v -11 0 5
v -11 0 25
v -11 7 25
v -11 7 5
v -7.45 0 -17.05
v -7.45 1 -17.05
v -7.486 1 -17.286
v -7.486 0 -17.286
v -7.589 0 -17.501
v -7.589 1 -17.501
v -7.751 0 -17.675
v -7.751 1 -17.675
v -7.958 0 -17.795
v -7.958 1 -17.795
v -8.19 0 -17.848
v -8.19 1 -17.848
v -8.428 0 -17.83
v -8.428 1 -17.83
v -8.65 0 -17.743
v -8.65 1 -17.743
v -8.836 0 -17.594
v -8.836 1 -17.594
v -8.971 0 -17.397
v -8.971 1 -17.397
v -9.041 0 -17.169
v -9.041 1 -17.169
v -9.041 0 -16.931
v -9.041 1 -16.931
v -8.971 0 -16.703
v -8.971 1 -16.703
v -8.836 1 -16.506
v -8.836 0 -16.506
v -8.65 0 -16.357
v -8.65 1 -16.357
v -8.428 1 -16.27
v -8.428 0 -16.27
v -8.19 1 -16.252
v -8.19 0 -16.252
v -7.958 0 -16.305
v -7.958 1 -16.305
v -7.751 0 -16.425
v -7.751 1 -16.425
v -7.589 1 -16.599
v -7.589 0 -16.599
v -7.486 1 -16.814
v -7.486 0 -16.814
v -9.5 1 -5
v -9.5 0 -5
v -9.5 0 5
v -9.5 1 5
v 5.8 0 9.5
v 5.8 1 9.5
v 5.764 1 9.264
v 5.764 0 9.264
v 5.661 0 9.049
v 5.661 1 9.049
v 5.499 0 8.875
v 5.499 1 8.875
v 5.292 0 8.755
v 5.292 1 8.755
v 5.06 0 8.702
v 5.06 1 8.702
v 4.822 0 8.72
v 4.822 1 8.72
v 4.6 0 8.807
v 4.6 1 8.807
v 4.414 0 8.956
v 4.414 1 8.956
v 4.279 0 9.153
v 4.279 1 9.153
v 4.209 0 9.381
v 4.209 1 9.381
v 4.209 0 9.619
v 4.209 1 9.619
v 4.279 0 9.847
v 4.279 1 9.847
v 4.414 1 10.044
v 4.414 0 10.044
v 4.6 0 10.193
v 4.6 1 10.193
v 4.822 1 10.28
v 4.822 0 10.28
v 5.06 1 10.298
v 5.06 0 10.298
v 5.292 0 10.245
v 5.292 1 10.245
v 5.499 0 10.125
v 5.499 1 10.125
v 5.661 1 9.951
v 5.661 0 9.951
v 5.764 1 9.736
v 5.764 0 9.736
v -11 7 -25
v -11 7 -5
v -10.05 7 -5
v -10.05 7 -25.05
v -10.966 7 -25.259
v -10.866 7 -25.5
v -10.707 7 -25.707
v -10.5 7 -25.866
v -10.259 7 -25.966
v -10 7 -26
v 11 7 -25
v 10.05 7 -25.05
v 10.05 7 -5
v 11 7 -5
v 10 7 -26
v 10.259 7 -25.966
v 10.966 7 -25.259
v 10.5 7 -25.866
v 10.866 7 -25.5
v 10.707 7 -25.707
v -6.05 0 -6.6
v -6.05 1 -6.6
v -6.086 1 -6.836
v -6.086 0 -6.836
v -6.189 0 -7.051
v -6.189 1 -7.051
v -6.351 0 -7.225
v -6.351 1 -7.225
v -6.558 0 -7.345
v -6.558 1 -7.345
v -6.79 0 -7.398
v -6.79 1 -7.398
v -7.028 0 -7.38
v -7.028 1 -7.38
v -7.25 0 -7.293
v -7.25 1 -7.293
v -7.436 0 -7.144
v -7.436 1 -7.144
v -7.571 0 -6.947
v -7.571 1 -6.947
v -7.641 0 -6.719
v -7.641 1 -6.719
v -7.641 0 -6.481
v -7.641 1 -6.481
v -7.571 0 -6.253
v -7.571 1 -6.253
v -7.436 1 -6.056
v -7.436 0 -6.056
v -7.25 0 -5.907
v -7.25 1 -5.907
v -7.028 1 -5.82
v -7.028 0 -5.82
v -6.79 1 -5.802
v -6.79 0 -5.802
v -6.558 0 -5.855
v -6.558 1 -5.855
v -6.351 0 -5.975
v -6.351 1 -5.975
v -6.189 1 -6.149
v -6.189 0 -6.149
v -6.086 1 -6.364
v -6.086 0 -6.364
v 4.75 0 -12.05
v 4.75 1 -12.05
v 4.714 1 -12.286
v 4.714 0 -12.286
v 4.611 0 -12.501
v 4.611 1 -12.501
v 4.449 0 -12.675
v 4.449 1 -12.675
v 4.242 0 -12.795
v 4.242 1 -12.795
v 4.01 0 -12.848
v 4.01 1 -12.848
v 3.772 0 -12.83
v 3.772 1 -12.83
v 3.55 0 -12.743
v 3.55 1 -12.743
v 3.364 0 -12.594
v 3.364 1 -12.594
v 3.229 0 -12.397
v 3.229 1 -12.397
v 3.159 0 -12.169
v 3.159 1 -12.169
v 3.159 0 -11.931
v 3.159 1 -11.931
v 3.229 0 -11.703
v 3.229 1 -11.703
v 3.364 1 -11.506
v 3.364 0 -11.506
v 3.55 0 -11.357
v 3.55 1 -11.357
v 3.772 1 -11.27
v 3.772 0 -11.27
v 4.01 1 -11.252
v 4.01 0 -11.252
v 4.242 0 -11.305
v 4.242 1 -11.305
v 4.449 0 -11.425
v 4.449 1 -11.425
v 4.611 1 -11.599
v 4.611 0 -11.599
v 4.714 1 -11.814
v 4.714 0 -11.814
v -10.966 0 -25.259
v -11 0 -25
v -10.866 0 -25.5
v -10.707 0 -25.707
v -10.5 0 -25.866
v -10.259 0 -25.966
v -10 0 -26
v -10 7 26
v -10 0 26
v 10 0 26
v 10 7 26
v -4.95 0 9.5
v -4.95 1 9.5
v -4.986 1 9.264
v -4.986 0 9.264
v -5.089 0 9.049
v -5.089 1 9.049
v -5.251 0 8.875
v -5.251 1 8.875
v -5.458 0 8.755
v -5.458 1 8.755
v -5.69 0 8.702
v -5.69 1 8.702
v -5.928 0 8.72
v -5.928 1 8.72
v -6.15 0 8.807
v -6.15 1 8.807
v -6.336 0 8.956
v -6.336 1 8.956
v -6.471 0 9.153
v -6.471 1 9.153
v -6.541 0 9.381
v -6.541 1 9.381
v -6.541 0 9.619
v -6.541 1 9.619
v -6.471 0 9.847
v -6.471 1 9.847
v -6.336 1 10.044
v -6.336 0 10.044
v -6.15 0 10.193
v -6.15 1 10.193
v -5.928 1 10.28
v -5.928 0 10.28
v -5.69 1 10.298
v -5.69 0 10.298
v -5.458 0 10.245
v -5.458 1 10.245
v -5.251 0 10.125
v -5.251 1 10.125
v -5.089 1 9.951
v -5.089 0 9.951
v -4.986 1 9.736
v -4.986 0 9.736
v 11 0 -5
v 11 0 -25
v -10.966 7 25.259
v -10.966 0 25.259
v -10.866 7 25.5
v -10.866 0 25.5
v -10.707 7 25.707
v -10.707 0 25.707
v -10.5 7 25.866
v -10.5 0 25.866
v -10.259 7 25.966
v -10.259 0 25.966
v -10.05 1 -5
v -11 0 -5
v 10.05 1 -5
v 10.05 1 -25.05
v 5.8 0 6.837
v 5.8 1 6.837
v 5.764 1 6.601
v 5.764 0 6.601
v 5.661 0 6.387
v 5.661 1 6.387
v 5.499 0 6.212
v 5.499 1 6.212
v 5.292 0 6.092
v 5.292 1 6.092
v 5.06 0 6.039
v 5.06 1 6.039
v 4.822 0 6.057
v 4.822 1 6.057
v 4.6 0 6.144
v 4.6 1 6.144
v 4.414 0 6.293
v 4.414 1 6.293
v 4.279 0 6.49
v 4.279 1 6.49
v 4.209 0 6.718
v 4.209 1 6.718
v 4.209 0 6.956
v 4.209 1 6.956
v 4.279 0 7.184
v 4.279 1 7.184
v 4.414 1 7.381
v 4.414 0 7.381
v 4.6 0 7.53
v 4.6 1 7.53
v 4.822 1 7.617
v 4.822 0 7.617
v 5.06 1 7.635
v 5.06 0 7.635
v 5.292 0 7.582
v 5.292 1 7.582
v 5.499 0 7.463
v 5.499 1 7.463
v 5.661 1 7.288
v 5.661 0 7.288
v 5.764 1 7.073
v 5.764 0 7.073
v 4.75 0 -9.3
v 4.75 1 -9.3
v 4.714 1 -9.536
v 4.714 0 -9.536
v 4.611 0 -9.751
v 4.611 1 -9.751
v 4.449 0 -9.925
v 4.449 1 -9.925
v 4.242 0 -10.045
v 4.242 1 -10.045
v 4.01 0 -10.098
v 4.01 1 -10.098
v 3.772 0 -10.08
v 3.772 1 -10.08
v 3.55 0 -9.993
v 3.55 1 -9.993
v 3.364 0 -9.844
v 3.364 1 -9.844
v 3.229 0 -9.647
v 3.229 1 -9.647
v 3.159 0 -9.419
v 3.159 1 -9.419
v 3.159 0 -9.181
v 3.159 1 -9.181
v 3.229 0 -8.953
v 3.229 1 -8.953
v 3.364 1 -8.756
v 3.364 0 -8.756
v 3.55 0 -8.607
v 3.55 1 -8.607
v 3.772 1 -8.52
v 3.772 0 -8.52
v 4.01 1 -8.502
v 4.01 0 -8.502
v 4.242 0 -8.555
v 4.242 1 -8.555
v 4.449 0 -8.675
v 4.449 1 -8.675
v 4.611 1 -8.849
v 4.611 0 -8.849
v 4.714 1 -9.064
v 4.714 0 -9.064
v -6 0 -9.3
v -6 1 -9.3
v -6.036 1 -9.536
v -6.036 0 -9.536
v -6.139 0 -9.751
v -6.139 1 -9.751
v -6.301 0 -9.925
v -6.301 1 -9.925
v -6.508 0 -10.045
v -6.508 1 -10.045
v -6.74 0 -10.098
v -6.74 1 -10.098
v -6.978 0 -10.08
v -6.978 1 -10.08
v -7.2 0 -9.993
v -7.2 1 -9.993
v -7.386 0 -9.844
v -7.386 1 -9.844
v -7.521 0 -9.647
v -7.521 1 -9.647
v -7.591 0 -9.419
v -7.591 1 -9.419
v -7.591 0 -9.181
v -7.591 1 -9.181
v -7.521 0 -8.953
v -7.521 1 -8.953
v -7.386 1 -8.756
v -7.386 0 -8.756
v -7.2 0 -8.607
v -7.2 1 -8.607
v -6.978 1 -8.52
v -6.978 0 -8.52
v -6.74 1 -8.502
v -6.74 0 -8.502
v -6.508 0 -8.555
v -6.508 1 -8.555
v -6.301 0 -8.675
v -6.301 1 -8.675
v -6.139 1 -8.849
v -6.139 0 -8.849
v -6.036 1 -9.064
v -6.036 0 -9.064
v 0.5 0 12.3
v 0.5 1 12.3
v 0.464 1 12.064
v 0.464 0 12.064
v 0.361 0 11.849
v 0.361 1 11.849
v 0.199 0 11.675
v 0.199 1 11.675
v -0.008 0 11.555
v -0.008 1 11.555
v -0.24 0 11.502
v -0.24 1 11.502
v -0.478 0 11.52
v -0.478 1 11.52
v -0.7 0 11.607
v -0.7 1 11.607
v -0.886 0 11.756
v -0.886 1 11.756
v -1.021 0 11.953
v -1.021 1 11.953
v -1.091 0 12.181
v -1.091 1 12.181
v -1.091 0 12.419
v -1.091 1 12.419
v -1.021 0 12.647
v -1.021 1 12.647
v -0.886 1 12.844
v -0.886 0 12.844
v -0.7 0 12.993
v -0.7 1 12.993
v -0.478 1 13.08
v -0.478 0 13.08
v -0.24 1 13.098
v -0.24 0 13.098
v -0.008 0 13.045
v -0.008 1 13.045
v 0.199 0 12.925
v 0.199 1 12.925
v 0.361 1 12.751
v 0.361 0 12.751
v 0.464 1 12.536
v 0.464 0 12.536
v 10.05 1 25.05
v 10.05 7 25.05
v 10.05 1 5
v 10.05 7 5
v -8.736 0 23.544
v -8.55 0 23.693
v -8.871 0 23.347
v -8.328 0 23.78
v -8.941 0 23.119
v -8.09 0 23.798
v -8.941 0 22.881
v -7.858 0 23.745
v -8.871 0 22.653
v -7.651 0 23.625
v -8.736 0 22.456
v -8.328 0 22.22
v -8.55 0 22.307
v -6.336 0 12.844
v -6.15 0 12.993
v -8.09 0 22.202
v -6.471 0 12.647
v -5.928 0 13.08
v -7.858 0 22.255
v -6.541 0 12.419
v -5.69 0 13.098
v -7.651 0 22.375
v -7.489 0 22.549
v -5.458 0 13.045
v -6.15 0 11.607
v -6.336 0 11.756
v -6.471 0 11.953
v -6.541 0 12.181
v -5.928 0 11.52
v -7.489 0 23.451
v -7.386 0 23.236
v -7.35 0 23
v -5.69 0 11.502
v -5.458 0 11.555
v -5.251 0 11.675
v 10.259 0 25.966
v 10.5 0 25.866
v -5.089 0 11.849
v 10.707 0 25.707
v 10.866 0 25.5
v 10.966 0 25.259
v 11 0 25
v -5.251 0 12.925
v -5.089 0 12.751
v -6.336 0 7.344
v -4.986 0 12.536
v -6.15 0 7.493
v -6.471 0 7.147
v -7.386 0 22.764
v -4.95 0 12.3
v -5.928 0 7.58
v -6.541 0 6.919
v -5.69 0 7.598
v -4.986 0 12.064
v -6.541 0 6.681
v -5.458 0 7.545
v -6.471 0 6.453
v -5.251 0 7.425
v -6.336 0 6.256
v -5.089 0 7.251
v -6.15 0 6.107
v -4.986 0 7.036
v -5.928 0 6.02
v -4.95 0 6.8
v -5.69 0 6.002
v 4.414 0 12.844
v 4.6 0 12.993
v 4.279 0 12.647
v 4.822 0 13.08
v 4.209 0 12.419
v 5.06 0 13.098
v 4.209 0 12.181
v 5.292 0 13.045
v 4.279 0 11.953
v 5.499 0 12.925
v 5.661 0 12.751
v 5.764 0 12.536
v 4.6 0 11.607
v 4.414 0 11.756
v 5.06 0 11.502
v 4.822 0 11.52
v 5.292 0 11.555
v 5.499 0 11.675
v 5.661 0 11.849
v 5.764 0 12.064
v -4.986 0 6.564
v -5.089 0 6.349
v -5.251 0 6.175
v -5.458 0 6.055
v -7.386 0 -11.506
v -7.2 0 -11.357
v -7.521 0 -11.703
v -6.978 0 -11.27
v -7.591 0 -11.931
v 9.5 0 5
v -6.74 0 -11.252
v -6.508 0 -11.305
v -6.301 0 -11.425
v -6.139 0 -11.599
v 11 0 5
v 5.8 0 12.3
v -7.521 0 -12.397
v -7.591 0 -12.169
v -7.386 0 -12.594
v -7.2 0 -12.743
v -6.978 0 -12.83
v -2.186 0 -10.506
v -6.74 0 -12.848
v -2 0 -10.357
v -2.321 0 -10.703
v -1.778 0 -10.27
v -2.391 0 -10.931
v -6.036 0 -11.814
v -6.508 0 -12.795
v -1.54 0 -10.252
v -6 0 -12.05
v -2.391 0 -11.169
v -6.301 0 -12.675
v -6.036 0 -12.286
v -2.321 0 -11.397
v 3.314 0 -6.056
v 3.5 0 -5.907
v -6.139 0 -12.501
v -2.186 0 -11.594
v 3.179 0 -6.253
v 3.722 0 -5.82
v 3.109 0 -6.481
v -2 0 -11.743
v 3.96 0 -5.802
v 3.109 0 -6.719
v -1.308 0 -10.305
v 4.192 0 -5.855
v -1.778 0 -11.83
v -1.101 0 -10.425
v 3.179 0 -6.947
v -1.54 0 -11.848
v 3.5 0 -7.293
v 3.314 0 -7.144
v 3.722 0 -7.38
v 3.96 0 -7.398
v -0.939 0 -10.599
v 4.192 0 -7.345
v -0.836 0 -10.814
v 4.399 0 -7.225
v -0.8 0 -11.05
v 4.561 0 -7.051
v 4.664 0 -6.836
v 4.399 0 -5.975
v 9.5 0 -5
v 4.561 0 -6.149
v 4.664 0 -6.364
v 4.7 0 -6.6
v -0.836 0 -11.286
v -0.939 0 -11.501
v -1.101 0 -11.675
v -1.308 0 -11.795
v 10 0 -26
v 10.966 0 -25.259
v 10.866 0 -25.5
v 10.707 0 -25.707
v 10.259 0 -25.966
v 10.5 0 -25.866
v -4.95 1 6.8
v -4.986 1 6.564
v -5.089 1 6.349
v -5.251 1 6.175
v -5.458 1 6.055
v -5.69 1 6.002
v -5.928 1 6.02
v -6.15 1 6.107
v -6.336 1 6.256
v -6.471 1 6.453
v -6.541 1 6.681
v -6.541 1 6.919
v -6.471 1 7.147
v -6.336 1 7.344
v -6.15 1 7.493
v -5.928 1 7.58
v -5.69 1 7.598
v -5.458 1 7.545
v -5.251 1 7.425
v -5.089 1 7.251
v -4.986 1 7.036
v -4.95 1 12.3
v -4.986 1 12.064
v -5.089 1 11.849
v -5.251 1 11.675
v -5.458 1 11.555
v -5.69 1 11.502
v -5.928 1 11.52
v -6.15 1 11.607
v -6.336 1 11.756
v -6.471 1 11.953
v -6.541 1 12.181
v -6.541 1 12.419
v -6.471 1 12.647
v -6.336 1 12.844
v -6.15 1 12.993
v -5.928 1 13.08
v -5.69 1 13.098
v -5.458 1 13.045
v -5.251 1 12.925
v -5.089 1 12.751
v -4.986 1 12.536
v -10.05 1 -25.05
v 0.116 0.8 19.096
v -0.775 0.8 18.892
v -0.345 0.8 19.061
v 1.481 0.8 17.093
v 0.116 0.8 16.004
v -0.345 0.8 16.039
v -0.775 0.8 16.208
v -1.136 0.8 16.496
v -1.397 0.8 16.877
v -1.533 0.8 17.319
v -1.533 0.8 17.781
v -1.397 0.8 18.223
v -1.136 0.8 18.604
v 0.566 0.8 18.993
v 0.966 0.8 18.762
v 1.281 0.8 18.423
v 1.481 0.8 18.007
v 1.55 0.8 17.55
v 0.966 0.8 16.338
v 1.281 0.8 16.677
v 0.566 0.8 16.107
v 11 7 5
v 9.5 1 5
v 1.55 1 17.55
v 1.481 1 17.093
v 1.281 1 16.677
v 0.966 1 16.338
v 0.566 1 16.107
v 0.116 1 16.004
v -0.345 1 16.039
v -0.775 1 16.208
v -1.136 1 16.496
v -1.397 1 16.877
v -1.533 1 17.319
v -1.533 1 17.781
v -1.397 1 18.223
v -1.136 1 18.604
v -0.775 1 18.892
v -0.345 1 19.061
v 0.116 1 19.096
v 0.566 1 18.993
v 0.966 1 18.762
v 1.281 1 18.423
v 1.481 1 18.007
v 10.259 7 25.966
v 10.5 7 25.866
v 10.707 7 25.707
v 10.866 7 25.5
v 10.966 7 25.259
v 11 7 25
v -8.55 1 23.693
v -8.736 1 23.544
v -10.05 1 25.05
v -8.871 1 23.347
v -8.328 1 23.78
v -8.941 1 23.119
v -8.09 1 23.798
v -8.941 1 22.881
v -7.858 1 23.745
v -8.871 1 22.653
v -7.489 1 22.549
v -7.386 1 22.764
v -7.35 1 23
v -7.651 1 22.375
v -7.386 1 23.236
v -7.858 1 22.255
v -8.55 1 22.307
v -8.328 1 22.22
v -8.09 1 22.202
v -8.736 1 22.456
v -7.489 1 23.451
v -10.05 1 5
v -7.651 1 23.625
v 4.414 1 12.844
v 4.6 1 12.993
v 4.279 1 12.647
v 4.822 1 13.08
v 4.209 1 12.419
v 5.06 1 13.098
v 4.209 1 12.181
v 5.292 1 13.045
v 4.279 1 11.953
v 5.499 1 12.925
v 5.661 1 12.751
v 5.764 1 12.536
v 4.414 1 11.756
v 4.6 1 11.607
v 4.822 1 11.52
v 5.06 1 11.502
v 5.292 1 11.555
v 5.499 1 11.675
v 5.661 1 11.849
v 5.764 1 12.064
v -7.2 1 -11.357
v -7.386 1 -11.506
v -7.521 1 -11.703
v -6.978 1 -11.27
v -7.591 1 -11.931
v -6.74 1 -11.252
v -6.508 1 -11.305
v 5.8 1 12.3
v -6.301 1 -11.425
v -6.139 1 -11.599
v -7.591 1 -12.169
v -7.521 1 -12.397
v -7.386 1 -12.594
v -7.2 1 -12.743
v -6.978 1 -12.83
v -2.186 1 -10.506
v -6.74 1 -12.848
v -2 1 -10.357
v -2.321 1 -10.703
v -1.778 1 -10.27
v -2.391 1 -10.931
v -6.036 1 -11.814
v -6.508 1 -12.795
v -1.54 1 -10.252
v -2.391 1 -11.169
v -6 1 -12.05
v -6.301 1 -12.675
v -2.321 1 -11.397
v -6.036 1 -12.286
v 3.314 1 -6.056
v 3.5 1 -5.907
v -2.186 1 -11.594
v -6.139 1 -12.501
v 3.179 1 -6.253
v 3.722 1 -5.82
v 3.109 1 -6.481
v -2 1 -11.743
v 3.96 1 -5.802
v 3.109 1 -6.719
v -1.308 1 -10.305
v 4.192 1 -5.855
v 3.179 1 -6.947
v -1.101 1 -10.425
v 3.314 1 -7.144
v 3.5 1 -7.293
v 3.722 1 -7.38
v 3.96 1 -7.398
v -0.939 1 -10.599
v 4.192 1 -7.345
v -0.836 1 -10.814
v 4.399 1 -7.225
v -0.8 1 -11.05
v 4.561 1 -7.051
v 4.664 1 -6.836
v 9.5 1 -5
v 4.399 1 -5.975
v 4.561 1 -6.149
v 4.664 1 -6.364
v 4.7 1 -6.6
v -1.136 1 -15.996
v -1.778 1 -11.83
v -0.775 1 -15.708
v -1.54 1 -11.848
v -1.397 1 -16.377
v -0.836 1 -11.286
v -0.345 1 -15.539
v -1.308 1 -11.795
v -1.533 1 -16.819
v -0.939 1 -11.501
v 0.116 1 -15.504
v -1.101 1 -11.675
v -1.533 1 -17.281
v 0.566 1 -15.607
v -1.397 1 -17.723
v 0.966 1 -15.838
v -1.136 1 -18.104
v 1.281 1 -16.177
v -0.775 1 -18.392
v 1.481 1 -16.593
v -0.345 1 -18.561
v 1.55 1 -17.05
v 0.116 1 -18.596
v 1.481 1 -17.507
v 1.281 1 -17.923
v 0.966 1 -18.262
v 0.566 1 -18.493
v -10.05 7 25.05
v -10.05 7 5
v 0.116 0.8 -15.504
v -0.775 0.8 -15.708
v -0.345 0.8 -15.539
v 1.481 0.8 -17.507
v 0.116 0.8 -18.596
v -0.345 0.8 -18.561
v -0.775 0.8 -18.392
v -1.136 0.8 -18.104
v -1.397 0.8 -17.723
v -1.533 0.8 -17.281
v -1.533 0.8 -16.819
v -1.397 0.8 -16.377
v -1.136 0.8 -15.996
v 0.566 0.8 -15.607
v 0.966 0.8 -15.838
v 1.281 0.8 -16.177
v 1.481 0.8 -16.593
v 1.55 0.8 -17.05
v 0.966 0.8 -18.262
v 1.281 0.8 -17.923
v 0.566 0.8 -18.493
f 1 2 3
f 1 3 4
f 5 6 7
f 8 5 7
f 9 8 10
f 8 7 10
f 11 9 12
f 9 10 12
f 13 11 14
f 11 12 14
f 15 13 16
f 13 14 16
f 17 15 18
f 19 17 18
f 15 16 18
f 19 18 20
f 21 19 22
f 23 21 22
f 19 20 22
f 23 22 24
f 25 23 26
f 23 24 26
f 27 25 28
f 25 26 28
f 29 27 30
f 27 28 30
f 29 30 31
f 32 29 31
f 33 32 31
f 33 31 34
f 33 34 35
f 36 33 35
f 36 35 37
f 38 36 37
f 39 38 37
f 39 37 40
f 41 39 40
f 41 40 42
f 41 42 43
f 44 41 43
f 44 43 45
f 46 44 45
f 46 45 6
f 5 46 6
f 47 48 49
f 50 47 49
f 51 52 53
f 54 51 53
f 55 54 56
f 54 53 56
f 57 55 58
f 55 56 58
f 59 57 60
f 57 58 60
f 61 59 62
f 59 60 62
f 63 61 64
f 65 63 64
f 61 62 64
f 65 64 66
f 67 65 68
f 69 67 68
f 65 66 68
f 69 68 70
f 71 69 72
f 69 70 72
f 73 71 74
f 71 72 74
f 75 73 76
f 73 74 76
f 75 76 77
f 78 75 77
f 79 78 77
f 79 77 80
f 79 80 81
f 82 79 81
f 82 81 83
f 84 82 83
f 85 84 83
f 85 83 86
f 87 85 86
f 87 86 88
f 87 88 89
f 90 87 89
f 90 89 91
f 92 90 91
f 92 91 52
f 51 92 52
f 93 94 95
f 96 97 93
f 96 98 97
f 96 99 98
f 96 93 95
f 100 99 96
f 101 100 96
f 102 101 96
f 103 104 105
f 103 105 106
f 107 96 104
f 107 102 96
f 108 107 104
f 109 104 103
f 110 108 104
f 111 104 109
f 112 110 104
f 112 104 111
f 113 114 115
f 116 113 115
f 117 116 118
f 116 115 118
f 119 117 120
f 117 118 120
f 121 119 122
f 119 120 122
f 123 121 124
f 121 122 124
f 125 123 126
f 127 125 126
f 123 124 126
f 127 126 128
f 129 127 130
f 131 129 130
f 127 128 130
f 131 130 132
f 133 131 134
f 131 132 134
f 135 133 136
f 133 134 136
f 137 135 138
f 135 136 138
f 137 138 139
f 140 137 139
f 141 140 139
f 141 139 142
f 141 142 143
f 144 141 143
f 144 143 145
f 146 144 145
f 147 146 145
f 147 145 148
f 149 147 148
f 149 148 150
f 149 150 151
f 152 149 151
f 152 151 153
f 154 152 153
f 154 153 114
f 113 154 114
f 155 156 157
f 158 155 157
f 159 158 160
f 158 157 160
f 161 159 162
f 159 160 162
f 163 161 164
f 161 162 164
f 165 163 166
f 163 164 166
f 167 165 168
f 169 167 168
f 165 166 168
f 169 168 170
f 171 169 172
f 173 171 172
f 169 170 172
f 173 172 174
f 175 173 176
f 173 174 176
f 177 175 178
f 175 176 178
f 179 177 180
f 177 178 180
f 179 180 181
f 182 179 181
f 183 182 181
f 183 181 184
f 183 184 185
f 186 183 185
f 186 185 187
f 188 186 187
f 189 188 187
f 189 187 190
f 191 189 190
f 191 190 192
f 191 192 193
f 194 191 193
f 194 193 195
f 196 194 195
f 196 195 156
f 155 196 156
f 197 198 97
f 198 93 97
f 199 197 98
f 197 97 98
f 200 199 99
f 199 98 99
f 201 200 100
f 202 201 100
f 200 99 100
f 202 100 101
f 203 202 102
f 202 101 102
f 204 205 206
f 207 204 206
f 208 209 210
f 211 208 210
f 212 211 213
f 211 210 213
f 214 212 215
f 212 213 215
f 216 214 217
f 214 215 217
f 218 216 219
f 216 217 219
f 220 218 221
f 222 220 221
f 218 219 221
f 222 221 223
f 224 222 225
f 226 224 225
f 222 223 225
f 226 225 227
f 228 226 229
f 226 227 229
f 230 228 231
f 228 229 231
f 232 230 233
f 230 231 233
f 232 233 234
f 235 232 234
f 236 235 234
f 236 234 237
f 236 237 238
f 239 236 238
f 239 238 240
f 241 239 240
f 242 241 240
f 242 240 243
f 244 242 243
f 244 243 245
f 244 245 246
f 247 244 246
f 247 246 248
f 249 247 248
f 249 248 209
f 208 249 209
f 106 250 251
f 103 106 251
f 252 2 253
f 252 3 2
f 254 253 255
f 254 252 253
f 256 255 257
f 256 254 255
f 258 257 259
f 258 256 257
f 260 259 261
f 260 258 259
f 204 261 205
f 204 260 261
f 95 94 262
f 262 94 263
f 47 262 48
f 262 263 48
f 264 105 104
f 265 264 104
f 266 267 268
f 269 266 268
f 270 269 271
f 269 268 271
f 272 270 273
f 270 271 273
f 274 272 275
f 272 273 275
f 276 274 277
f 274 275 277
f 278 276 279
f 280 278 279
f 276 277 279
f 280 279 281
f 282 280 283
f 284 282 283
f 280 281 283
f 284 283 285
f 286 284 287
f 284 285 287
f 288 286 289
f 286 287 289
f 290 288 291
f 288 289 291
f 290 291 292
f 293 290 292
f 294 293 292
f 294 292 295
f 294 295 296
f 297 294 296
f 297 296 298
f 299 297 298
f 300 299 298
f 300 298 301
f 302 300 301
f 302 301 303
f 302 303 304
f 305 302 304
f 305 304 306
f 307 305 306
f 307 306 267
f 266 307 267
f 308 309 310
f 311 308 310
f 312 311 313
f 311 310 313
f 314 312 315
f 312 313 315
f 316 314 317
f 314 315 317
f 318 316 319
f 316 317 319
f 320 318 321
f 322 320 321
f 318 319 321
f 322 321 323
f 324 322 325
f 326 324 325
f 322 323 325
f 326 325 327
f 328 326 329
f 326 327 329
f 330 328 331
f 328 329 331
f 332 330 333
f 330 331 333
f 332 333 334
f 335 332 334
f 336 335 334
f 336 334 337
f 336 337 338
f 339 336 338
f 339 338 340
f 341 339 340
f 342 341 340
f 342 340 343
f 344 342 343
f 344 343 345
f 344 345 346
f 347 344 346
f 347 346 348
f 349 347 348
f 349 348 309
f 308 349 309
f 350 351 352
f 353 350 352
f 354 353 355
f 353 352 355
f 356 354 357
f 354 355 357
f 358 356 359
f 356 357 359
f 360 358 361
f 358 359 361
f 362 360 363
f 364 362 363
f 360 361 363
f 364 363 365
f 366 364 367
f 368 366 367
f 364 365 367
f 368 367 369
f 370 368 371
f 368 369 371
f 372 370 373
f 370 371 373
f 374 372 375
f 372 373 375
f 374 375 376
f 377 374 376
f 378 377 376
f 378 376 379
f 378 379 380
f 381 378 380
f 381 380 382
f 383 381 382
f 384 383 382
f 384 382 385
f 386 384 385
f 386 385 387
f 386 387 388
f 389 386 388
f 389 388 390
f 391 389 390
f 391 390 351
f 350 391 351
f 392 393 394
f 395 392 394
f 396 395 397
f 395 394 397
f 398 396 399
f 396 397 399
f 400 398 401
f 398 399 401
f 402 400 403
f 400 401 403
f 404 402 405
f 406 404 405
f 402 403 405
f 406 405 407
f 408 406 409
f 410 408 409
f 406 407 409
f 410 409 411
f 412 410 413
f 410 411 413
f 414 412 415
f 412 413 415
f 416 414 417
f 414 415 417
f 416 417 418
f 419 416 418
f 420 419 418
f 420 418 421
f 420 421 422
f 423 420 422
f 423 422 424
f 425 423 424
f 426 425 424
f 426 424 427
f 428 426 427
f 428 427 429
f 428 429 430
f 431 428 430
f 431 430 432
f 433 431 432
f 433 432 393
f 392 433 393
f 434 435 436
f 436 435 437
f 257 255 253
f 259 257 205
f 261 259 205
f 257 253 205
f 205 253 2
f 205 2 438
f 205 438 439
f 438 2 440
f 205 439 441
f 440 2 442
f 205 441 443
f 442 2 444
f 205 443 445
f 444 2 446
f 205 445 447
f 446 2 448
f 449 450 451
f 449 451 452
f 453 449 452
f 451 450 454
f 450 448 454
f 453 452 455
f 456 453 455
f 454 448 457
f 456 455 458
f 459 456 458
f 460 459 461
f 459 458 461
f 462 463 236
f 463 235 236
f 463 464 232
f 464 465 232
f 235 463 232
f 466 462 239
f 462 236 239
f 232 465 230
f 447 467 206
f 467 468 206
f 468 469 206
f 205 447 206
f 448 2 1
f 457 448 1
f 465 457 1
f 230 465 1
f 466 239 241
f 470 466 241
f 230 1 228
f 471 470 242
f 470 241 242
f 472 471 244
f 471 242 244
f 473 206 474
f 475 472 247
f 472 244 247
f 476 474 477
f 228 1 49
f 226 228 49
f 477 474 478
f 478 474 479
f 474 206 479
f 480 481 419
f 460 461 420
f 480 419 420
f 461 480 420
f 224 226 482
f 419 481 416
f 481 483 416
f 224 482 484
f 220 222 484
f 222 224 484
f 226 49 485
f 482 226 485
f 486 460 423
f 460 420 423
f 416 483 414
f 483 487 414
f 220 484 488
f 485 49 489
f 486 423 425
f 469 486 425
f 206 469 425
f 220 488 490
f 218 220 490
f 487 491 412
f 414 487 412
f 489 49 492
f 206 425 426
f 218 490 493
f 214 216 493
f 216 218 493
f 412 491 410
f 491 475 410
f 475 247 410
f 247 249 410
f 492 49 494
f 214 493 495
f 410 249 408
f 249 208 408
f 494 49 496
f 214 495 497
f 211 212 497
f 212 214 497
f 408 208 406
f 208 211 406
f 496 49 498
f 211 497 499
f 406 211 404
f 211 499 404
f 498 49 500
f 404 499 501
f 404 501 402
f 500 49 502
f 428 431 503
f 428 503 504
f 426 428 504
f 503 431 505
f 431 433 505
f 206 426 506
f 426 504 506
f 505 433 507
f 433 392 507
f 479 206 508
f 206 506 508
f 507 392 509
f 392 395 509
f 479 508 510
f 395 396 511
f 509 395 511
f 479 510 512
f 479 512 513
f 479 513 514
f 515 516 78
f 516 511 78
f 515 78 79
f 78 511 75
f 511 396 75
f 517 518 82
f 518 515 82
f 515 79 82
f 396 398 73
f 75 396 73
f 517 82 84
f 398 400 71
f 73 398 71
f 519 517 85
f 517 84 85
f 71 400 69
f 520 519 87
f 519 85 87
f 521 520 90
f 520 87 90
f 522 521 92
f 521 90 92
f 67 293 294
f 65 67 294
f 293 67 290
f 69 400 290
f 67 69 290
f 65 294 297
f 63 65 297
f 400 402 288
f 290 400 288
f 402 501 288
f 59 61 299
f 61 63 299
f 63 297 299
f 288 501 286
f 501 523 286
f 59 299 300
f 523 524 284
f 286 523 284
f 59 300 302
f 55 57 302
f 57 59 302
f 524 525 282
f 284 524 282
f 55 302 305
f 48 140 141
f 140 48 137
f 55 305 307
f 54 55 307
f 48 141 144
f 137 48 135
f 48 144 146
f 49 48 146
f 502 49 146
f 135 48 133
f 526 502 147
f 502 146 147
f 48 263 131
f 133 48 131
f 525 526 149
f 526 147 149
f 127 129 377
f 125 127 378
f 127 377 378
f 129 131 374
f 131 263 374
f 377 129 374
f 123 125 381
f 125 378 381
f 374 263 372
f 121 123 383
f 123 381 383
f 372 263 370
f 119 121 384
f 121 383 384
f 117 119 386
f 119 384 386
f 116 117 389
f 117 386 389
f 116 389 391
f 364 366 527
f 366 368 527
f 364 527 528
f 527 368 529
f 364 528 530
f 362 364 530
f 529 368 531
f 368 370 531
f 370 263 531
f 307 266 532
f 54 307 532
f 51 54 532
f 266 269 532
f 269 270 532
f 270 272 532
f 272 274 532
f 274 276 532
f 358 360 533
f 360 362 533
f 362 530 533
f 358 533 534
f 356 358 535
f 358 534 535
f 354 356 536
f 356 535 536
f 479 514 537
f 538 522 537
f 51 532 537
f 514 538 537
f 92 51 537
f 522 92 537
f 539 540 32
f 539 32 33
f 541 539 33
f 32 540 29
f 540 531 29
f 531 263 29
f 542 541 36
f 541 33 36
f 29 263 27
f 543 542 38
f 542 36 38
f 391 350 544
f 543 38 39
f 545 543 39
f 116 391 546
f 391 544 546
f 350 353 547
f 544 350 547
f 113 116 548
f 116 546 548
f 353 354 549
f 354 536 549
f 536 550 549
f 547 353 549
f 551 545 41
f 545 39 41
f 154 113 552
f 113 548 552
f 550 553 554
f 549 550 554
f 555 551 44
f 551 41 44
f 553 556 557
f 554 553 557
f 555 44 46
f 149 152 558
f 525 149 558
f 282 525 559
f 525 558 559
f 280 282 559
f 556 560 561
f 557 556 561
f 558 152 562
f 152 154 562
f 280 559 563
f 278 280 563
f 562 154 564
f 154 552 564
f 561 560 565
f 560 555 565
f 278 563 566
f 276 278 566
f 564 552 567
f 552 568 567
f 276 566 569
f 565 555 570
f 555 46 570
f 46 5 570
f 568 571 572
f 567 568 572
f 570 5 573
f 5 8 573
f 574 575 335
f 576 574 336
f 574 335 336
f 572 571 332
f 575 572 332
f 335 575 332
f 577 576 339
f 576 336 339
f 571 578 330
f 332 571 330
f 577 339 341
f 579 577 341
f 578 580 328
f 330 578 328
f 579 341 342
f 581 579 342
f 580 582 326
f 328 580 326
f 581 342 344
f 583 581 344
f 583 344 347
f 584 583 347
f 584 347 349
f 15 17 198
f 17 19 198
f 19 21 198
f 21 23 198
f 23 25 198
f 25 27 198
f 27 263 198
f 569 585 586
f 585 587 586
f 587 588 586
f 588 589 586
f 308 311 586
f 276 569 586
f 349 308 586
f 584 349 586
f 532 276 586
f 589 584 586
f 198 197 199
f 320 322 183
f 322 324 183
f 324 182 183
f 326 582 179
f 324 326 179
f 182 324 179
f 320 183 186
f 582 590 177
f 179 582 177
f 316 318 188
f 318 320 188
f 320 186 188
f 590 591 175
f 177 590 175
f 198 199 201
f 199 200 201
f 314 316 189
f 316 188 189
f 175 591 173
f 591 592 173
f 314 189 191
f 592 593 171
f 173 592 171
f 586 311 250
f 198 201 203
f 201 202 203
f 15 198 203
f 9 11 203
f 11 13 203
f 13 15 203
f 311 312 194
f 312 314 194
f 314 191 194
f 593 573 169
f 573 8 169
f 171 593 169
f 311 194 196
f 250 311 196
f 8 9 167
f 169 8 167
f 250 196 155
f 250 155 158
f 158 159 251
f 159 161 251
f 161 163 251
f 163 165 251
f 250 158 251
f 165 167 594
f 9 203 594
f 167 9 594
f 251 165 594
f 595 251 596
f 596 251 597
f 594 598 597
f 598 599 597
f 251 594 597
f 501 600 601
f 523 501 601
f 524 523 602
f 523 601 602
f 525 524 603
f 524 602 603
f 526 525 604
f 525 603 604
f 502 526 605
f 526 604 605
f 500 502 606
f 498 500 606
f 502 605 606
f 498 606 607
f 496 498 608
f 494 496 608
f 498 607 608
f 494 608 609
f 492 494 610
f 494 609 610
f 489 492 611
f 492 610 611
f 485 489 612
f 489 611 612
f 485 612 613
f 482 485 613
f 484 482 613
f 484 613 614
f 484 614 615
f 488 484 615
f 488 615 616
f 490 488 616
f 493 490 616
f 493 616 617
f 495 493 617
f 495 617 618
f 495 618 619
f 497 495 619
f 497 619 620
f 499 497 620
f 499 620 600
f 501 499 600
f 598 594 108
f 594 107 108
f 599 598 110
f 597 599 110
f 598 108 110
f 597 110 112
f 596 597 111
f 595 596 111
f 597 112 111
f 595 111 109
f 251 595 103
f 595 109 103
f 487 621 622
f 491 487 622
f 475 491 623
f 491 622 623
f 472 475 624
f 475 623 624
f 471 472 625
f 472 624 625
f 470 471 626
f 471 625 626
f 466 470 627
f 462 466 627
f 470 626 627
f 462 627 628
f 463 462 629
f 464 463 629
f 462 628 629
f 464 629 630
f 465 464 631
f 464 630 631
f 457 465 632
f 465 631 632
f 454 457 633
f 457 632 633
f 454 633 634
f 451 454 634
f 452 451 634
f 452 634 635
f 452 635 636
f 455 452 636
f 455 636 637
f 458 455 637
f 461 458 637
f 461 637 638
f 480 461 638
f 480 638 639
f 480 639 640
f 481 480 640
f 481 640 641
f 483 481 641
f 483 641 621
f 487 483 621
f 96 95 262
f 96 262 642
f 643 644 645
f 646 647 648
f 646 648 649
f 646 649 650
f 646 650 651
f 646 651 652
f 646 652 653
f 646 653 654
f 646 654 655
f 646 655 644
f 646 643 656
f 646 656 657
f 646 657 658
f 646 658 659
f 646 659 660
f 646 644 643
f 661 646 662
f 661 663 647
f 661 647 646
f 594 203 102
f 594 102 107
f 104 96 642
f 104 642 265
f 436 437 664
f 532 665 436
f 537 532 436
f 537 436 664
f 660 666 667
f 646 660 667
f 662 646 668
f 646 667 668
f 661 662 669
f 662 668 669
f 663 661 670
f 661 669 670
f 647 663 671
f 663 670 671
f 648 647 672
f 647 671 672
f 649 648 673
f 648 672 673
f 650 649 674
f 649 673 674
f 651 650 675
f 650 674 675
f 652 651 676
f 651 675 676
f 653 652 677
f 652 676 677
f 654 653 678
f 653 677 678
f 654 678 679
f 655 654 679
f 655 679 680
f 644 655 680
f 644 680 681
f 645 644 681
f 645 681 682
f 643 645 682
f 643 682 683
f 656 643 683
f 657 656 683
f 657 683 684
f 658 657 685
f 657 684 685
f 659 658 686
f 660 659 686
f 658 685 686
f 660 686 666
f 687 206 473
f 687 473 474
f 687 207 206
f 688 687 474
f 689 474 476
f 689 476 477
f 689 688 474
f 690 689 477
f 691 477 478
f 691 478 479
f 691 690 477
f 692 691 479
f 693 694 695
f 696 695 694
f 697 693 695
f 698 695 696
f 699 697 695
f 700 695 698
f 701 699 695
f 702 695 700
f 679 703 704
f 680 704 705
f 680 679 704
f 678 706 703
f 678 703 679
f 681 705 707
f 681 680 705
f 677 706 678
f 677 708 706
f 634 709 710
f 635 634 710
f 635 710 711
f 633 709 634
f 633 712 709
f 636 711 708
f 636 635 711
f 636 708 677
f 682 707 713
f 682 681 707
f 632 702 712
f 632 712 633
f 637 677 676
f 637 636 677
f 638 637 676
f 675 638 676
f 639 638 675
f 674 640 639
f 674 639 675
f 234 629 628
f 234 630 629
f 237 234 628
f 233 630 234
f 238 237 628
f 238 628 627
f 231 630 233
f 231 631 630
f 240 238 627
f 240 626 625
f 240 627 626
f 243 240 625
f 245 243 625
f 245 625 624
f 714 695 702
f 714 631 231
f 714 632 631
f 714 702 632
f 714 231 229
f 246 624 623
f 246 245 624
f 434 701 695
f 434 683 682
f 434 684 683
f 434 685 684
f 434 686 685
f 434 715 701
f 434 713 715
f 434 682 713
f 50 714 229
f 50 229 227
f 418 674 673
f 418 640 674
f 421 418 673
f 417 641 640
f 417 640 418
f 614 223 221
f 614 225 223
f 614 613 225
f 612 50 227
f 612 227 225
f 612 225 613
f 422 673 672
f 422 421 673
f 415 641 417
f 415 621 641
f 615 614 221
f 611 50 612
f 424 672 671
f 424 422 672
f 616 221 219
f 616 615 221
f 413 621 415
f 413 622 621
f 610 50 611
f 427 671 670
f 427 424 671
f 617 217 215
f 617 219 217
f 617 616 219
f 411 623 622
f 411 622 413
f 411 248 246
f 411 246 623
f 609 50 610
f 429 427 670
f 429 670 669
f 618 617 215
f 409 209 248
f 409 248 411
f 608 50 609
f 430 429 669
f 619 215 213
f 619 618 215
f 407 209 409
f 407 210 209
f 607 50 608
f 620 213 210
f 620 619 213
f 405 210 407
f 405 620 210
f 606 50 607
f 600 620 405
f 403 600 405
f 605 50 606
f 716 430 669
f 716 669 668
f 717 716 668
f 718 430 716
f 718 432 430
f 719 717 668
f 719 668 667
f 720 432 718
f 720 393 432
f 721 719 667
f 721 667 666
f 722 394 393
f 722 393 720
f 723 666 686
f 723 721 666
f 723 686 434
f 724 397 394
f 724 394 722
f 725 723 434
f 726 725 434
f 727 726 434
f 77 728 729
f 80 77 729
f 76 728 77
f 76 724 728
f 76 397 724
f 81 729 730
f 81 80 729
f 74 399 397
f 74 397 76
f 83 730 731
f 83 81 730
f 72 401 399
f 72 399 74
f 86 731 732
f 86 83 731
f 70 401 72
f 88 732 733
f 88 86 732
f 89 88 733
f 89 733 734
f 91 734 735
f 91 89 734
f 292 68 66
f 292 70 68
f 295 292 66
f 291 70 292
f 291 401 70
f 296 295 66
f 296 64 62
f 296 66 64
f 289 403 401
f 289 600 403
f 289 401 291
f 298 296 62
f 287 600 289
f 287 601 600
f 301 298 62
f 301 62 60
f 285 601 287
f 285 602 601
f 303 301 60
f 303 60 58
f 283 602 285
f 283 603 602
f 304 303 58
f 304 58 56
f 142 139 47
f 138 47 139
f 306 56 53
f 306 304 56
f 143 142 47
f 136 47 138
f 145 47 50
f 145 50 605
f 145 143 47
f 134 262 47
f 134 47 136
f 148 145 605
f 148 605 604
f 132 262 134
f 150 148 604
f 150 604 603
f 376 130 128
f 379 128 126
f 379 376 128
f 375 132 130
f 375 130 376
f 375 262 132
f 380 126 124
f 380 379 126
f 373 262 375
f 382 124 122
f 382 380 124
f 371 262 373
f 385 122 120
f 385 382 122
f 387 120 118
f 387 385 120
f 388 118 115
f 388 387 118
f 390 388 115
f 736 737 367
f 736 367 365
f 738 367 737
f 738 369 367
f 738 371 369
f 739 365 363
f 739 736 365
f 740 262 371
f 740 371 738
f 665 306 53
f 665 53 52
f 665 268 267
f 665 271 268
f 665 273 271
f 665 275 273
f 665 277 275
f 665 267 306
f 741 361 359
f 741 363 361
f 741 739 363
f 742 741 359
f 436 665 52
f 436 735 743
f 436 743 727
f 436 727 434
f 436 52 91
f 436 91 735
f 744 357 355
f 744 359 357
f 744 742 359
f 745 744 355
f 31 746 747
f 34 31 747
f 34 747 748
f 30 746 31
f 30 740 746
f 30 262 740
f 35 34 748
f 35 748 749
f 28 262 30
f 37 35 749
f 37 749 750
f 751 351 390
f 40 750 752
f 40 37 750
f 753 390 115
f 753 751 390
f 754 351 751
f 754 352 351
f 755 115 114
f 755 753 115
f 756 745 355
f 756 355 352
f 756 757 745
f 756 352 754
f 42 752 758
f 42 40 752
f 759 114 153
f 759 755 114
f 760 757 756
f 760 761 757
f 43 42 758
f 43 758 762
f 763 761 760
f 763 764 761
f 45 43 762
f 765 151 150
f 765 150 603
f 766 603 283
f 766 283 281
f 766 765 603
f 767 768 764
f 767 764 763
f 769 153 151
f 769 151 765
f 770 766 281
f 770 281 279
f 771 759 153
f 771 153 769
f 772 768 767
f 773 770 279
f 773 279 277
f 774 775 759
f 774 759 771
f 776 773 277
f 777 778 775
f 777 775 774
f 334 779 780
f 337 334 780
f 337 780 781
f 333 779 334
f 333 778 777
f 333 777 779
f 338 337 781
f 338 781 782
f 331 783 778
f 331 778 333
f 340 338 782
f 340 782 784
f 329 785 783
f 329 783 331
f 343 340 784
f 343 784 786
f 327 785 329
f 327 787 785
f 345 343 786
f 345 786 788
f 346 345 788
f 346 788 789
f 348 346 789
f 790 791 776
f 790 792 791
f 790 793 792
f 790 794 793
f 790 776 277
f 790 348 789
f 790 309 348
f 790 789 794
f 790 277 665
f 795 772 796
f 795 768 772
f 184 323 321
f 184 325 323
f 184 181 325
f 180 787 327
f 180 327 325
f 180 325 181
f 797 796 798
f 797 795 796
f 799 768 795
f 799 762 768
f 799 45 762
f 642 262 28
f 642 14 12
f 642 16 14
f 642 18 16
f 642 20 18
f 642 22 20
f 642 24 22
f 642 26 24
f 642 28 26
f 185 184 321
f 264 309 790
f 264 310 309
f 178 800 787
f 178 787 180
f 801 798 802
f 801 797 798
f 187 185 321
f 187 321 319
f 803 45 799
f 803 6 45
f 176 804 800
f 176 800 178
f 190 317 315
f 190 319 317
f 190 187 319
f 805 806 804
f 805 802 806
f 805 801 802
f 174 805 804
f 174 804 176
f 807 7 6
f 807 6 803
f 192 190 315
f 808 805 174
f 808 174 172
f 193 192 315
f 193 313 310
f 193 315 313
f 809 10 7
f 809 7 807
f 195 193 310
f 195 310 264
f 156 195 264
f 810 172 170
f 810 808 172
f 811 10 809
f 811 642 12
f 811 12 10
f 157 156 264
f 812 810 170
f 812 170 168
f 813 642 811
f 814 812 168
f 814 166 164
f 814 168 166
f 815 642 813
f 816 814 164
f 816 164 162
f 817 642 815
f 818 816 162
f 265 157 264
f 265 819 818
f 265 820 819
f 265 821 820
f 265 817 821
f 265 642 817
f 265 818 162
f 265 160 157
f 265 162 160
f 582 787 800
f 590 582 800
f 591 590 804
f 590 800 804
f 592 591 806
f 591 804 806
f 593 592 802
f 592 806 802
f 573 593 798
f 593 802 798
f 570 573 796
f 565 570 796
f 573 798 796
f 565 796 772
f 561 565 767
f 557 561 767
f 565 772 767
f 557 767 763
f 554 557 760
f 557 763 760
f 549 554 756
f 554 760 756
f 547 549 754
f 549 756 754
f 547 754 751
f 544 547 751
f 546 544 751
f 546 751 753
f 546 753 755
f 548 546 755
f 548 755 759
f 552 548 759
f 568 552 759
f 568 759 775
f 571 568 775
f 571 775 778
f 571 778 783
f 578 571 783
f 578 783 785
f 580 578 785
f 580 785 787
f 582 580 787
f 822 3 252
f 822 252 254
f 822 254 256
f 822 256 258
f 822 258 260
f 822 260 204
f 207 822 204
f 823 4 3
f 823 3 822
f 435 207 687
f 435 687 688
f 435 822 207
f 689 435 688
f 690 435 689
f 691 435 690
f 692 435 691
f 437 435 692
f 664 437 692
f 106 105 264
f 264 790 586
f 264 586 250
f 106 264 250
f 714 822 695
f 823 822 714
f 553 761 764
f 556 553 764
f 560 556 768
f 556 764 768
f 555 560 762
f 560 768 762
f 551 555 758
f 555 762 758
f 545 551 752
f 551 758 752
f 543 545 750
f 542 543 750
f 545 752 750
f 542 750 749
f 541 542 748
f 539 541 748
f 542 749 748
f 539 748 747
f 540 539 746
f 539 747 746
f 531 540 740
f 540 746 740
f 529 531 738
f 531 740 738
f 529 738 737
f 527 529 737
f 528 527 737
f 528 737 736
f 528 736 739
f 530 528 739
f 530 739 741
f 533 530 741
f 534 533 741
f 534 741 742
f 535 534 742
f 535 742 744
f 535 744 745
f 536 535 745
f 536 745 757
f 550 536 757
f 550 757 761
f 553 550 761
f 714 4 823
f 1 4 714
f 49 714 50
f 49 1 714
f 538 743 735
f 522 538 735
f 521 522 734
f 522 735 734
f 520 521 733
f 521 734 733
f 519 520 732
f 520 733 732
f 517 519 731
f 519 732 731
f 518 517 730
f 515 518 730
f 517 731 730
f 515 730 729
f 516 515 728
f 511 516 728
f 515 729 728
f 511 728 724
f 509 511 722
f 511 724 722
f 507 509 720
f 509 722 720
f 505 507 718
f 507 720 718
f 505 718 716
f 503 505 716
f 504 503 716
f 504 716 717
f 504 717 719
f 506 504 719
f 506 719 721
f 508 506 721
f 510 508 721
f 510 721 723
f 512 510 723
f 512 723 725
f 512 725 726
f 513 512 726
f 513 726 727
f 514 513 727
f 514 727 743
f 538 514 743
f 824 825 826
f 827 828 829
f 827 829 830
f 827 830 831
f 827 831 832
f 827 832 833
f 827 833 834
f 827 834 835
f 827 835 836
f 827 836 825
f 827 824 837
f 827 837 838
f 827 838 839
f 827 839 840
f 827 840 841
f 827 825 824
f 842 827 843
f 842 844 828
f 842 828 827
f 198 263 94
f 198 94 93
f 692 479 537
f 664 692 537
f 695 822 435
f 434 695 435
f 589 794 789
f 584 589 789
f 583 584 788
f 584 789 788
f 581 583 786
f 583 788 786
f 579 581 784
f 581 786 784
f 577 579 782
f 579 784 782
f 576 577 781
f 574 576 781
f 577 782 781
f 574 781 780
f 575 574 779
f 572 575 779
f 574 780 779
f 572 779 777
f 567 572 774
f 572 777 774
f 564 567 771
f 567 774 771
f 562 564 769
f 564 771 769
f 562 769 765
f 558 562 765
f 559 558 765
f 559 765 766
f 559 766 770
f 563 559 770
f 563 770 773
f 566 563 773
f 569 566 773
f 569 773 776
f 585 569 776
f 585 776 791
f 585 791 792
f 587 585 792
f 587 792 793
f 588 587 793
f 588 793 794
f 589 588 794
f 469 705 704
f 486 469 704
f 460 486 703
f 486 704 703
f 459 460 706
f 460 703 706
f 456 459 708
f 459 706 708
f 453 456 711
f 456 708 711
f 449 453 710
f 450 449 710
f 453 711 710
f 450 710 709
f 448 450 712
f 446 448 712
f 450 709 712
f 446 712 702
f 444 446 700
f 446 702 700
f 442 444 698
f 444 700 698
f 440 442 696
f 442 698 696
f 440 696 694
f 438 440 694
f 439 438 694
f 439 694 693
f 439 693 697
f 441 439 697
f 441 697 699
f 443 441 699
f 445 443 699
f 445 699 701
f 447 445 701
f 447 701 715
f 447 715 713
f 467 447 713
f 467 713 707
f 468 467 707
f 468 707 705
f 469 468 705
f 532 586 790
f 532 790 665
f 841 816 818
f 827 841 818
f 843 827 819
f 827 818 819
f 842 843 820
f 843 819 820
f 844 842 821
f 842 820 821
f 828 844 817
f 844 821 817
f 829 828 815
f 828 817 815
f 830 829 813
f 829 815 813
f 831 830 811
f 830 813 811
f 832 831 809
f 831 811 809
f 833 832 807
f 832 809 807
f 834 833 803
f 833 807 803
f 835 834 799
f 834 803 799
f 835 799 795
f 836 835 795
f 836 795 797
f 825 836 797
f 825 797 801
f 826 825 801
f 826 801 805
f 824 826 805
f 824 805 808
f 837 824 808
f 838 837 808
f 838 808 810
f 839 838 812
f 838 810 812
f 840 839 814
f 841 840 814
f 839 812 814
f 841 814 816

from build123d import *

# Parameters (mm, degrees)
SKETCH1_W               = 22
SKETCH1_H               = 52
BOSS_EXTRUDE1_DEPTH     = 7
SKETCH2_W               = 20.1
SKETCH2_H               = 50.1
CUT_EXTRUDE1_DEPTH      = 6
FILLET1_R               = 1
SKETCH4_W               = 1.5
SKETCH4_H               = 10
CUT_EXTRUDE3_DEPTH      = 8
SKETCH5_R               = 1.55
CUT_EXTRUDE4_DEPTH      = 0.2
SKETCH6_R               = 1.55
CUT_EXTRUDE5_DEPTH      = 0.2
SKETCH7_R               = 0.8
CUT_EXTRUDE6_DEPTH      = 7
CUT_EXTRUDE6_DEPTH_BACK = 2
CUT_EXTRUDE7_REACH      = 3
SKETCH8_R               = 0.8
CUT_EXTRUDE9_REACH      = 3
SKETCH9_R               = 0.8
CUT_EXTRUDE10_REACH     = 3
SKETCH10_R              = 0.8
CUT_EXTRUDE11_REACH     = 3
SKETCH11_R              = 0.8
CUT_EXTRUDE12_REACH     = 3
SKETCH12_R              = 0.8
CUT_EXTRUDE13_REACH     = 3
SKETCH13_R              = 0.8
CUT_EXTRUDE14_REACH     = 3
SKETCH14_R              = 0.8
CUT_EXTRUDE15_REACH     = 3
SKETCH15_R              = 0.8
CUT_EXTRUDE16_REACH     = 3
SKETCH16_R              = 0.8


with BuildPart() as part:
    # Sketch1 → Boss-Extrude1 (new body)
    with BuildSketch(Plane(origin=(0, 0, 0), x_dir=(1, 0, 0), z_dir=(0, 1, 0))):
        Rectangle(SKETCH1_W, SKETCH1_H)
    extrude(amount=BOSS_EXTRUDE1_DEPTH)

    # Sketch2 → Cut-Extrude1 (cut)
    with BuildSketch(Plane(origin=(0, 7, 0), x_dir=(1, 0, 0), z_dir=(0, 1, 0))):
        Rectangle(SKETCH2_W, SKETCH2_H)
    extrude(amount=-CUT_EXTRUDE1_DEPTH, mode=Mode.SUBTRACT)

    # Fillet1
    fillet1_edges = [part.edges().sort_by_distance(p)[0] for p in [
        (11, 3.5, 26),
        (-11, 3.5, 26),
        (-11, 3.5, -26),
        (11, 3.5, -26),
    ]]
    fillet(fillet1_edges, radius=FILLET1_R)

    # Sketch4 → Cut-Extrude3 (cut, through all)
    with BuildSketch(Plane.XZ):
        with Locations((-10.25, 0)):
            Rectangle(SKETCH4_W, SKETCH4_H)
        with Locations((10.25, 0)):
            Rectangle(SKETCH4_W, SKETCH4_H)
    extrude(amount=-CUT_EXTRUDE3_DEPTH, mode=Mode.SUBTRACT)

    # Sketch5 → Cut-Extrude4 (cut)
    with BuildSketch(Plane(origin=(0, 1, 0), x_dir=(1, 0, 0), z_dir=(0, 1, 0))):
        with Locations((0, -17.55)):
            Circle(SKETCH5_R)
    extrude(amount=-CUT_EXTRUDE4_DEPTH, mode=Mode.SUBTRACT)

    # Sketch6 → Cut-Extrude5 (cut)
    with BuildSketch(Plane(origin=(0, 1, 0), x_dir=(1, 0, 0), z_dir=(0, 1, 0))):
        with Locations((0, 17.05)):
            Circle(SKETCH6_R)
    extrude(amount=-CUT_EXTRUDE5_DEPTH, mode=Mode.SUBTRACT)

    # Sketch7 → Cut-Extrude6 (cut, two sides)
    with BuildSketch(Plane(origin=(0, 1, 0), x_dir=(1, 0, 0), z_dir=(0, 1, 0))) as cut_extrude6_sk:
        with Locations((-8.15, -23)):
            Circle(SKETCH7_R)
    extrude(amount=CUT_EXTRUDE6_DEPTH, mode=Mode.SUBTRACT)
    extrude(cut_extrude6_sk.sketch, amount=-CUT_EXTRUDE6_DEPTH_BACK, mode=Mode.SUBTRACT)

    # Sketch8 → Cut-Extrude7 (cut, up to next)
    with BuildSketch(Plane(origin=(0, 1, 0), x_dir=(1, 0, 0), z_dir=(0, 1, 0)), mode=Mode.PRIVATE) as cut_extrude7_sk1:
        with Locations((-5.75, -12.3)):
            Circle(SKETCH8_R)
    cut_extrude7_tool1 = extrude(cut_extrude7_sk1.sketch, amount=-CUT_EXTRUDE7_REACH, mode=Mode.PRIVATE) & part.part
    add(cut_extrude7_tool1.solids().sort_by_distance((-5.75, 1, 12.3))[0], mode=Mode.SUBTRACT)
    # Sketch8 → Cut-Extrude7 (cut, up to next)
    with BuildSketch(Plane(origin=(0, 1, 0), x_dir=(1, 0, 0), z_dir=(0, 1, 0)), mode=Mode.PRIVATE) as cut_extrude7_sk2:
        with Locations((5, -12.3)):
            Circle(SKETCH8_R)
    cut_extrude7_tool2 = extrude(cut_extrude7_sk2.sketch, amount=-CUT_EXTRUDE7_REACH, mode=Mode.PRIVATE) & part.part
    add(cut_extrude7_tool2.solids().sort_by_distance((5, 1, 12.3))[0], mode=Mode.SUBTRACT)

    # Sketch9 → Cut-Extrude9 (cut, up to next)
    with BuildSketch(Plane(origin=(0, 1, 0), x_dir=(1, 0, 0), z_dir=(0, 1, 0)), mode=Mode.PRIVATE) as cut_extrude9_sk1:
        with Locations((-5.75, -9.5)):
            Circle(SKETCH9_R)
    cut_extrude9_tool1 = extrude(cut_extrude9_sk1.sketch, amount=-CUT_EXTRUDE9_REACH, mode=Mode.PRIVATE) & part.part
    add(cut_extrude9_tool1.solids().sort_by_distance((-5.75, 1, 9.5))[0], mode=Mode.SUBTRACT)
    # Sketch9 → Cut-Extrude9 (cut, up to next)
    with BuildSketch(Plane(origin=(0, 1, 0), x_dir=(1, 0, 0), z_dir=(0, 1, 0)), mode=Mode.PRIVATE) as cut_extrude9_sk2:
        with Locations((5, -9.5)):
            Circle(SKETCH9_R)
    cut_extrude9_tool2 = extrude(cut_extrude9_sk2.sketch, amount=-CUT_EXTRUDE9_REACH, mode=Mode.PRIVATE) & part.part
    add(cut_extrude9_tool2.solids().sort_by_distance((5, 1, 9.5))[0], mode=Mode.SUBTRACT)

    # Sketch10 → Cut-Extrude10 (cut, up to next)
    with BuildSketch(Plane(origin=(0, 1, 0), x_dir=(1, 0, 0), z_dir=(0, 1, 0)), mode=Mode.PRIVATE) as cut_extrude10_sk1:
        with Locations((-5.75, -6.8)):
            Circle(SKETCH10_R)
    cut_extrude10_tool1 = extrude(cut_extrude10_sk1.sketch, amount=-CUT_EXTRUDE10_REACH, mode=Mode.PRIVATE) & part.part
    add(cut_extrude10_tool1.solids().sort_by_distance((-5.75, 1, 6.8))[0], mode=Mode.SUBTRACT)
    # Sketch10 → Cut-Extrude10 (cut, up to next)
    with BuildSketch(Plane(origin=(0, 1, 0), x_dir=(1, 0, 0), z_dir=(0, 1, 0)), mode=Mode.PRIVATE) as cut_extrude10_sk2:
        with Locations((5, -6.837159935)):
            Circle(SKETCH10_R)
    cut_extrude10_tool2 = extrude(cut_extrude10_sk2.sketch, amount=-CUT_EXTRUDE10_REACH, mode=Mode.PRIVATE) & part.part
    add(cut_extrude10_tool2.solids().sort_by_distance((5, 1, 6.83716))[0], mode=Mode.SUBTRACT)

    # Sketch11 → Cut-Extrude11 (cut, up to next)
    with BuildSketch(Plane(origin=(0, 1, 0), x_dir=(1, 0, 0), z_dir=(0, 1, 0)), mode=Mode.PRIVATE) as cut_extrude11_sk1:
        with Locations((-0.3, -12.3)):
            Circle(SKETCH11_R)
    cut_extrude11_tool1 = extrude(cut_extrude11_sk1.sketch, amount=-CUT_EXTRUDE11_REACH, mode=Mode.PRIVATE) & part.part
    add(cut_extrude11_tool1.solids().sort_by_distance((-0.3, 1, 12.3))[0], mode=Mode.SUBTRACT)

    # Sketch12 → Cut-Extrude12 (cut, up to next)
    with BuildSketch(Plane(origin=(0, 1, 0), x_dir=(1, 0, 0), z_dir=(0, 1, 0)), mode=Mode.PRIVATE) as cut_extrude12_sk1:
        with Locations((3.95, 12.05)):
            Circle(SKETCH12_R)
    cut_extrude12_tool1 = extrude(cut_extrude12_sk1.sketch, amount=-CUT_EXTRUDE12_REACH, mode=Mode.PRIVATE) & part.part
    add(cut_extrude12_tool1.solids().sort_by_distance((3.95, 1, -12.05))[0], mode=Mode.SUBTRACT)
    # Sketch12 → Cut-Extrude12 (cut, up to next)
    with BuildSketch(Plane(origin=(0, 1, 0), x_dir=(1, 0, 0), z_dir=(0, 1, 0)), mode=Mode.PRIVATE) as cut_extrude12_sk2:
        with Locations((-6.8, 12.05)):
            Circle(SKETCH12_R)
    cut_extrude12_tool2 = extrude(cut_extrude12_sk2.sketch, amount=-CUT_EXTRUDE12_REACH, mode=Mode.PRIVATE) & part.part
    add(cut_extrude12_tool2.solids().sort_by_distance((-6.8, 1, -12.05))[0], mode=Mode.SUBTRACT)

    # Sketch13 → Cut-Extrude13 (cut, up to next)
    with BuildSketch(Plane(origin=(0, 1, 0), x_dir=(1, 0, 0), z_dir=(0, 1, 0)), mode=Mode.PRIVATE) as cut_extrude13_sk1:
        with Locations((3.95, 9.3)):
            Circle(SKETCH13_R)
    cut_extrude13_tool1 = extrude(cut_extrude13_sk1.sketch, amount=-CUT_EXTRUDE13_REACH, mode=Mode.PRIVATE) & part.part
    add(cut_extrude13_tool1.solids().sort_by_distance((3.95, 1, -9.3))[0], mode=Mode.SUBTRACT)
    # Sketch13 → Cut-Extrude13 (cut, up to next)
    with BuildSketch(Plane(origin=(0, 1, 0), x_dir=(1, 0, 0), z_dir=(0, 1, 0)), mode=Mode.PRIVATE) as cut_extrude13_sk2:
        with Locations((-6.8, 9.3)):
            Circle(SKETCH13_R)
    cut_extrude13_tool2 = extrude(cut_extrude13_sk2.sketch, amount=-CUT_EXTRUDE13_REACH, mode=Mode.PRIVATE) & part.part
    add(cut_extrude13_tool2.solids().sort_by_distance((-6.8, 1, -9.3))[0], mode=Mode.SUBTRACT)

    # Sketch14 → Cut-Extrude14 (cut, up to next)
    with BuildSketch(Plane(origin=(0, 1, 0), x_dir=(1, 0, 0), z_dir=(0, 1, 0)), mode=Mode.PRIVATE) as cut_extrude14_sk1:
        with Locations((3.9, 6.6)):
            Circle(SKETCH14_R)
    cut_extrude14_tool1 = extrude(cut_extrude14_sk1.sketch, amount=-CUT_EXTRUDE14_REACH, mode=Mode.PRIVATE) & part.part
    add(cut_extrude14_tool1.solids().sort_by_distance((3.9, 1, -6.6))[0], mode=Mode.SUBTRACT)
    # Sketch14 → Cut-Extrude14 (cut, up to next)
    with BuildSketch(Plane(origin=(0, 1, 0), x_dir=(1, 0, 0), z_dir=(0, 1, 0)), mode=Mode.PRIVATE) as cut_extrude14_sk2:
        with Locations((-6.85, 6.6)):
            Circle(SKETCH14_R)
    cut_extrude14_tool2 = extrude(cut_extrude14_sk2.sketch, amount=-CUT_EXTRUDE14_REACH, mode=Mode.PRIVATE) & part.part
    add(cut_extrude14_tool2.solids().sort_by_distance((-6.85, 1, -6.6))[0], mode=Mode.SUBTRACT)

    # Sketch15 → Cut-Extrude15 (cut, up to next)
    with BuildSketch(Plane(origin=(0, 1, 0), x_dir=(1, 0, 0), z_dir=(0, 1, 0)), mode=Mode.PRIVATE) as cut_extrude15_sk1:
        with Locations((-1.6, 11.05)):
            Circle(SKETCH15_R)
    cut_extrude15_tool1 = extrude(cut_extrude15_sk1.sketch, amount=-CUT_EXTRUDE15_REACH, mode=Mode.PRIVATE) & part.part
    add(cut_extrude15_tool1.solids().sort_by_distance((-1.6, 1, -11.05))[0], mode=Mode.SUBTRACT)

    # Sketch16 → Cut-Extrude16 (cut, up to next)
    with BuildSketch(Plane(origin=(0, 1, 0), x_dir=(1, 0, 0), z_dir=(0, 1, 0)), mode=Mode.PRIVATE) as cut_extrude16_sk1:
        with Locations((-8.25, 17.05)):
            Circle(SKETCH16_R)
    cut_extrude16_tool1 = extrude(cut_extrude16_sk1.sketch, amount=-CUT_EXTRUDE16_REACH, mode=Mode.PRIVATE) & part.part
    add(cut_extrude16_tool1.solids().sort_by_distance((-8.25, 1, -17.05))[0], mode=Mode.SUBTRACT)


solid = part.part
